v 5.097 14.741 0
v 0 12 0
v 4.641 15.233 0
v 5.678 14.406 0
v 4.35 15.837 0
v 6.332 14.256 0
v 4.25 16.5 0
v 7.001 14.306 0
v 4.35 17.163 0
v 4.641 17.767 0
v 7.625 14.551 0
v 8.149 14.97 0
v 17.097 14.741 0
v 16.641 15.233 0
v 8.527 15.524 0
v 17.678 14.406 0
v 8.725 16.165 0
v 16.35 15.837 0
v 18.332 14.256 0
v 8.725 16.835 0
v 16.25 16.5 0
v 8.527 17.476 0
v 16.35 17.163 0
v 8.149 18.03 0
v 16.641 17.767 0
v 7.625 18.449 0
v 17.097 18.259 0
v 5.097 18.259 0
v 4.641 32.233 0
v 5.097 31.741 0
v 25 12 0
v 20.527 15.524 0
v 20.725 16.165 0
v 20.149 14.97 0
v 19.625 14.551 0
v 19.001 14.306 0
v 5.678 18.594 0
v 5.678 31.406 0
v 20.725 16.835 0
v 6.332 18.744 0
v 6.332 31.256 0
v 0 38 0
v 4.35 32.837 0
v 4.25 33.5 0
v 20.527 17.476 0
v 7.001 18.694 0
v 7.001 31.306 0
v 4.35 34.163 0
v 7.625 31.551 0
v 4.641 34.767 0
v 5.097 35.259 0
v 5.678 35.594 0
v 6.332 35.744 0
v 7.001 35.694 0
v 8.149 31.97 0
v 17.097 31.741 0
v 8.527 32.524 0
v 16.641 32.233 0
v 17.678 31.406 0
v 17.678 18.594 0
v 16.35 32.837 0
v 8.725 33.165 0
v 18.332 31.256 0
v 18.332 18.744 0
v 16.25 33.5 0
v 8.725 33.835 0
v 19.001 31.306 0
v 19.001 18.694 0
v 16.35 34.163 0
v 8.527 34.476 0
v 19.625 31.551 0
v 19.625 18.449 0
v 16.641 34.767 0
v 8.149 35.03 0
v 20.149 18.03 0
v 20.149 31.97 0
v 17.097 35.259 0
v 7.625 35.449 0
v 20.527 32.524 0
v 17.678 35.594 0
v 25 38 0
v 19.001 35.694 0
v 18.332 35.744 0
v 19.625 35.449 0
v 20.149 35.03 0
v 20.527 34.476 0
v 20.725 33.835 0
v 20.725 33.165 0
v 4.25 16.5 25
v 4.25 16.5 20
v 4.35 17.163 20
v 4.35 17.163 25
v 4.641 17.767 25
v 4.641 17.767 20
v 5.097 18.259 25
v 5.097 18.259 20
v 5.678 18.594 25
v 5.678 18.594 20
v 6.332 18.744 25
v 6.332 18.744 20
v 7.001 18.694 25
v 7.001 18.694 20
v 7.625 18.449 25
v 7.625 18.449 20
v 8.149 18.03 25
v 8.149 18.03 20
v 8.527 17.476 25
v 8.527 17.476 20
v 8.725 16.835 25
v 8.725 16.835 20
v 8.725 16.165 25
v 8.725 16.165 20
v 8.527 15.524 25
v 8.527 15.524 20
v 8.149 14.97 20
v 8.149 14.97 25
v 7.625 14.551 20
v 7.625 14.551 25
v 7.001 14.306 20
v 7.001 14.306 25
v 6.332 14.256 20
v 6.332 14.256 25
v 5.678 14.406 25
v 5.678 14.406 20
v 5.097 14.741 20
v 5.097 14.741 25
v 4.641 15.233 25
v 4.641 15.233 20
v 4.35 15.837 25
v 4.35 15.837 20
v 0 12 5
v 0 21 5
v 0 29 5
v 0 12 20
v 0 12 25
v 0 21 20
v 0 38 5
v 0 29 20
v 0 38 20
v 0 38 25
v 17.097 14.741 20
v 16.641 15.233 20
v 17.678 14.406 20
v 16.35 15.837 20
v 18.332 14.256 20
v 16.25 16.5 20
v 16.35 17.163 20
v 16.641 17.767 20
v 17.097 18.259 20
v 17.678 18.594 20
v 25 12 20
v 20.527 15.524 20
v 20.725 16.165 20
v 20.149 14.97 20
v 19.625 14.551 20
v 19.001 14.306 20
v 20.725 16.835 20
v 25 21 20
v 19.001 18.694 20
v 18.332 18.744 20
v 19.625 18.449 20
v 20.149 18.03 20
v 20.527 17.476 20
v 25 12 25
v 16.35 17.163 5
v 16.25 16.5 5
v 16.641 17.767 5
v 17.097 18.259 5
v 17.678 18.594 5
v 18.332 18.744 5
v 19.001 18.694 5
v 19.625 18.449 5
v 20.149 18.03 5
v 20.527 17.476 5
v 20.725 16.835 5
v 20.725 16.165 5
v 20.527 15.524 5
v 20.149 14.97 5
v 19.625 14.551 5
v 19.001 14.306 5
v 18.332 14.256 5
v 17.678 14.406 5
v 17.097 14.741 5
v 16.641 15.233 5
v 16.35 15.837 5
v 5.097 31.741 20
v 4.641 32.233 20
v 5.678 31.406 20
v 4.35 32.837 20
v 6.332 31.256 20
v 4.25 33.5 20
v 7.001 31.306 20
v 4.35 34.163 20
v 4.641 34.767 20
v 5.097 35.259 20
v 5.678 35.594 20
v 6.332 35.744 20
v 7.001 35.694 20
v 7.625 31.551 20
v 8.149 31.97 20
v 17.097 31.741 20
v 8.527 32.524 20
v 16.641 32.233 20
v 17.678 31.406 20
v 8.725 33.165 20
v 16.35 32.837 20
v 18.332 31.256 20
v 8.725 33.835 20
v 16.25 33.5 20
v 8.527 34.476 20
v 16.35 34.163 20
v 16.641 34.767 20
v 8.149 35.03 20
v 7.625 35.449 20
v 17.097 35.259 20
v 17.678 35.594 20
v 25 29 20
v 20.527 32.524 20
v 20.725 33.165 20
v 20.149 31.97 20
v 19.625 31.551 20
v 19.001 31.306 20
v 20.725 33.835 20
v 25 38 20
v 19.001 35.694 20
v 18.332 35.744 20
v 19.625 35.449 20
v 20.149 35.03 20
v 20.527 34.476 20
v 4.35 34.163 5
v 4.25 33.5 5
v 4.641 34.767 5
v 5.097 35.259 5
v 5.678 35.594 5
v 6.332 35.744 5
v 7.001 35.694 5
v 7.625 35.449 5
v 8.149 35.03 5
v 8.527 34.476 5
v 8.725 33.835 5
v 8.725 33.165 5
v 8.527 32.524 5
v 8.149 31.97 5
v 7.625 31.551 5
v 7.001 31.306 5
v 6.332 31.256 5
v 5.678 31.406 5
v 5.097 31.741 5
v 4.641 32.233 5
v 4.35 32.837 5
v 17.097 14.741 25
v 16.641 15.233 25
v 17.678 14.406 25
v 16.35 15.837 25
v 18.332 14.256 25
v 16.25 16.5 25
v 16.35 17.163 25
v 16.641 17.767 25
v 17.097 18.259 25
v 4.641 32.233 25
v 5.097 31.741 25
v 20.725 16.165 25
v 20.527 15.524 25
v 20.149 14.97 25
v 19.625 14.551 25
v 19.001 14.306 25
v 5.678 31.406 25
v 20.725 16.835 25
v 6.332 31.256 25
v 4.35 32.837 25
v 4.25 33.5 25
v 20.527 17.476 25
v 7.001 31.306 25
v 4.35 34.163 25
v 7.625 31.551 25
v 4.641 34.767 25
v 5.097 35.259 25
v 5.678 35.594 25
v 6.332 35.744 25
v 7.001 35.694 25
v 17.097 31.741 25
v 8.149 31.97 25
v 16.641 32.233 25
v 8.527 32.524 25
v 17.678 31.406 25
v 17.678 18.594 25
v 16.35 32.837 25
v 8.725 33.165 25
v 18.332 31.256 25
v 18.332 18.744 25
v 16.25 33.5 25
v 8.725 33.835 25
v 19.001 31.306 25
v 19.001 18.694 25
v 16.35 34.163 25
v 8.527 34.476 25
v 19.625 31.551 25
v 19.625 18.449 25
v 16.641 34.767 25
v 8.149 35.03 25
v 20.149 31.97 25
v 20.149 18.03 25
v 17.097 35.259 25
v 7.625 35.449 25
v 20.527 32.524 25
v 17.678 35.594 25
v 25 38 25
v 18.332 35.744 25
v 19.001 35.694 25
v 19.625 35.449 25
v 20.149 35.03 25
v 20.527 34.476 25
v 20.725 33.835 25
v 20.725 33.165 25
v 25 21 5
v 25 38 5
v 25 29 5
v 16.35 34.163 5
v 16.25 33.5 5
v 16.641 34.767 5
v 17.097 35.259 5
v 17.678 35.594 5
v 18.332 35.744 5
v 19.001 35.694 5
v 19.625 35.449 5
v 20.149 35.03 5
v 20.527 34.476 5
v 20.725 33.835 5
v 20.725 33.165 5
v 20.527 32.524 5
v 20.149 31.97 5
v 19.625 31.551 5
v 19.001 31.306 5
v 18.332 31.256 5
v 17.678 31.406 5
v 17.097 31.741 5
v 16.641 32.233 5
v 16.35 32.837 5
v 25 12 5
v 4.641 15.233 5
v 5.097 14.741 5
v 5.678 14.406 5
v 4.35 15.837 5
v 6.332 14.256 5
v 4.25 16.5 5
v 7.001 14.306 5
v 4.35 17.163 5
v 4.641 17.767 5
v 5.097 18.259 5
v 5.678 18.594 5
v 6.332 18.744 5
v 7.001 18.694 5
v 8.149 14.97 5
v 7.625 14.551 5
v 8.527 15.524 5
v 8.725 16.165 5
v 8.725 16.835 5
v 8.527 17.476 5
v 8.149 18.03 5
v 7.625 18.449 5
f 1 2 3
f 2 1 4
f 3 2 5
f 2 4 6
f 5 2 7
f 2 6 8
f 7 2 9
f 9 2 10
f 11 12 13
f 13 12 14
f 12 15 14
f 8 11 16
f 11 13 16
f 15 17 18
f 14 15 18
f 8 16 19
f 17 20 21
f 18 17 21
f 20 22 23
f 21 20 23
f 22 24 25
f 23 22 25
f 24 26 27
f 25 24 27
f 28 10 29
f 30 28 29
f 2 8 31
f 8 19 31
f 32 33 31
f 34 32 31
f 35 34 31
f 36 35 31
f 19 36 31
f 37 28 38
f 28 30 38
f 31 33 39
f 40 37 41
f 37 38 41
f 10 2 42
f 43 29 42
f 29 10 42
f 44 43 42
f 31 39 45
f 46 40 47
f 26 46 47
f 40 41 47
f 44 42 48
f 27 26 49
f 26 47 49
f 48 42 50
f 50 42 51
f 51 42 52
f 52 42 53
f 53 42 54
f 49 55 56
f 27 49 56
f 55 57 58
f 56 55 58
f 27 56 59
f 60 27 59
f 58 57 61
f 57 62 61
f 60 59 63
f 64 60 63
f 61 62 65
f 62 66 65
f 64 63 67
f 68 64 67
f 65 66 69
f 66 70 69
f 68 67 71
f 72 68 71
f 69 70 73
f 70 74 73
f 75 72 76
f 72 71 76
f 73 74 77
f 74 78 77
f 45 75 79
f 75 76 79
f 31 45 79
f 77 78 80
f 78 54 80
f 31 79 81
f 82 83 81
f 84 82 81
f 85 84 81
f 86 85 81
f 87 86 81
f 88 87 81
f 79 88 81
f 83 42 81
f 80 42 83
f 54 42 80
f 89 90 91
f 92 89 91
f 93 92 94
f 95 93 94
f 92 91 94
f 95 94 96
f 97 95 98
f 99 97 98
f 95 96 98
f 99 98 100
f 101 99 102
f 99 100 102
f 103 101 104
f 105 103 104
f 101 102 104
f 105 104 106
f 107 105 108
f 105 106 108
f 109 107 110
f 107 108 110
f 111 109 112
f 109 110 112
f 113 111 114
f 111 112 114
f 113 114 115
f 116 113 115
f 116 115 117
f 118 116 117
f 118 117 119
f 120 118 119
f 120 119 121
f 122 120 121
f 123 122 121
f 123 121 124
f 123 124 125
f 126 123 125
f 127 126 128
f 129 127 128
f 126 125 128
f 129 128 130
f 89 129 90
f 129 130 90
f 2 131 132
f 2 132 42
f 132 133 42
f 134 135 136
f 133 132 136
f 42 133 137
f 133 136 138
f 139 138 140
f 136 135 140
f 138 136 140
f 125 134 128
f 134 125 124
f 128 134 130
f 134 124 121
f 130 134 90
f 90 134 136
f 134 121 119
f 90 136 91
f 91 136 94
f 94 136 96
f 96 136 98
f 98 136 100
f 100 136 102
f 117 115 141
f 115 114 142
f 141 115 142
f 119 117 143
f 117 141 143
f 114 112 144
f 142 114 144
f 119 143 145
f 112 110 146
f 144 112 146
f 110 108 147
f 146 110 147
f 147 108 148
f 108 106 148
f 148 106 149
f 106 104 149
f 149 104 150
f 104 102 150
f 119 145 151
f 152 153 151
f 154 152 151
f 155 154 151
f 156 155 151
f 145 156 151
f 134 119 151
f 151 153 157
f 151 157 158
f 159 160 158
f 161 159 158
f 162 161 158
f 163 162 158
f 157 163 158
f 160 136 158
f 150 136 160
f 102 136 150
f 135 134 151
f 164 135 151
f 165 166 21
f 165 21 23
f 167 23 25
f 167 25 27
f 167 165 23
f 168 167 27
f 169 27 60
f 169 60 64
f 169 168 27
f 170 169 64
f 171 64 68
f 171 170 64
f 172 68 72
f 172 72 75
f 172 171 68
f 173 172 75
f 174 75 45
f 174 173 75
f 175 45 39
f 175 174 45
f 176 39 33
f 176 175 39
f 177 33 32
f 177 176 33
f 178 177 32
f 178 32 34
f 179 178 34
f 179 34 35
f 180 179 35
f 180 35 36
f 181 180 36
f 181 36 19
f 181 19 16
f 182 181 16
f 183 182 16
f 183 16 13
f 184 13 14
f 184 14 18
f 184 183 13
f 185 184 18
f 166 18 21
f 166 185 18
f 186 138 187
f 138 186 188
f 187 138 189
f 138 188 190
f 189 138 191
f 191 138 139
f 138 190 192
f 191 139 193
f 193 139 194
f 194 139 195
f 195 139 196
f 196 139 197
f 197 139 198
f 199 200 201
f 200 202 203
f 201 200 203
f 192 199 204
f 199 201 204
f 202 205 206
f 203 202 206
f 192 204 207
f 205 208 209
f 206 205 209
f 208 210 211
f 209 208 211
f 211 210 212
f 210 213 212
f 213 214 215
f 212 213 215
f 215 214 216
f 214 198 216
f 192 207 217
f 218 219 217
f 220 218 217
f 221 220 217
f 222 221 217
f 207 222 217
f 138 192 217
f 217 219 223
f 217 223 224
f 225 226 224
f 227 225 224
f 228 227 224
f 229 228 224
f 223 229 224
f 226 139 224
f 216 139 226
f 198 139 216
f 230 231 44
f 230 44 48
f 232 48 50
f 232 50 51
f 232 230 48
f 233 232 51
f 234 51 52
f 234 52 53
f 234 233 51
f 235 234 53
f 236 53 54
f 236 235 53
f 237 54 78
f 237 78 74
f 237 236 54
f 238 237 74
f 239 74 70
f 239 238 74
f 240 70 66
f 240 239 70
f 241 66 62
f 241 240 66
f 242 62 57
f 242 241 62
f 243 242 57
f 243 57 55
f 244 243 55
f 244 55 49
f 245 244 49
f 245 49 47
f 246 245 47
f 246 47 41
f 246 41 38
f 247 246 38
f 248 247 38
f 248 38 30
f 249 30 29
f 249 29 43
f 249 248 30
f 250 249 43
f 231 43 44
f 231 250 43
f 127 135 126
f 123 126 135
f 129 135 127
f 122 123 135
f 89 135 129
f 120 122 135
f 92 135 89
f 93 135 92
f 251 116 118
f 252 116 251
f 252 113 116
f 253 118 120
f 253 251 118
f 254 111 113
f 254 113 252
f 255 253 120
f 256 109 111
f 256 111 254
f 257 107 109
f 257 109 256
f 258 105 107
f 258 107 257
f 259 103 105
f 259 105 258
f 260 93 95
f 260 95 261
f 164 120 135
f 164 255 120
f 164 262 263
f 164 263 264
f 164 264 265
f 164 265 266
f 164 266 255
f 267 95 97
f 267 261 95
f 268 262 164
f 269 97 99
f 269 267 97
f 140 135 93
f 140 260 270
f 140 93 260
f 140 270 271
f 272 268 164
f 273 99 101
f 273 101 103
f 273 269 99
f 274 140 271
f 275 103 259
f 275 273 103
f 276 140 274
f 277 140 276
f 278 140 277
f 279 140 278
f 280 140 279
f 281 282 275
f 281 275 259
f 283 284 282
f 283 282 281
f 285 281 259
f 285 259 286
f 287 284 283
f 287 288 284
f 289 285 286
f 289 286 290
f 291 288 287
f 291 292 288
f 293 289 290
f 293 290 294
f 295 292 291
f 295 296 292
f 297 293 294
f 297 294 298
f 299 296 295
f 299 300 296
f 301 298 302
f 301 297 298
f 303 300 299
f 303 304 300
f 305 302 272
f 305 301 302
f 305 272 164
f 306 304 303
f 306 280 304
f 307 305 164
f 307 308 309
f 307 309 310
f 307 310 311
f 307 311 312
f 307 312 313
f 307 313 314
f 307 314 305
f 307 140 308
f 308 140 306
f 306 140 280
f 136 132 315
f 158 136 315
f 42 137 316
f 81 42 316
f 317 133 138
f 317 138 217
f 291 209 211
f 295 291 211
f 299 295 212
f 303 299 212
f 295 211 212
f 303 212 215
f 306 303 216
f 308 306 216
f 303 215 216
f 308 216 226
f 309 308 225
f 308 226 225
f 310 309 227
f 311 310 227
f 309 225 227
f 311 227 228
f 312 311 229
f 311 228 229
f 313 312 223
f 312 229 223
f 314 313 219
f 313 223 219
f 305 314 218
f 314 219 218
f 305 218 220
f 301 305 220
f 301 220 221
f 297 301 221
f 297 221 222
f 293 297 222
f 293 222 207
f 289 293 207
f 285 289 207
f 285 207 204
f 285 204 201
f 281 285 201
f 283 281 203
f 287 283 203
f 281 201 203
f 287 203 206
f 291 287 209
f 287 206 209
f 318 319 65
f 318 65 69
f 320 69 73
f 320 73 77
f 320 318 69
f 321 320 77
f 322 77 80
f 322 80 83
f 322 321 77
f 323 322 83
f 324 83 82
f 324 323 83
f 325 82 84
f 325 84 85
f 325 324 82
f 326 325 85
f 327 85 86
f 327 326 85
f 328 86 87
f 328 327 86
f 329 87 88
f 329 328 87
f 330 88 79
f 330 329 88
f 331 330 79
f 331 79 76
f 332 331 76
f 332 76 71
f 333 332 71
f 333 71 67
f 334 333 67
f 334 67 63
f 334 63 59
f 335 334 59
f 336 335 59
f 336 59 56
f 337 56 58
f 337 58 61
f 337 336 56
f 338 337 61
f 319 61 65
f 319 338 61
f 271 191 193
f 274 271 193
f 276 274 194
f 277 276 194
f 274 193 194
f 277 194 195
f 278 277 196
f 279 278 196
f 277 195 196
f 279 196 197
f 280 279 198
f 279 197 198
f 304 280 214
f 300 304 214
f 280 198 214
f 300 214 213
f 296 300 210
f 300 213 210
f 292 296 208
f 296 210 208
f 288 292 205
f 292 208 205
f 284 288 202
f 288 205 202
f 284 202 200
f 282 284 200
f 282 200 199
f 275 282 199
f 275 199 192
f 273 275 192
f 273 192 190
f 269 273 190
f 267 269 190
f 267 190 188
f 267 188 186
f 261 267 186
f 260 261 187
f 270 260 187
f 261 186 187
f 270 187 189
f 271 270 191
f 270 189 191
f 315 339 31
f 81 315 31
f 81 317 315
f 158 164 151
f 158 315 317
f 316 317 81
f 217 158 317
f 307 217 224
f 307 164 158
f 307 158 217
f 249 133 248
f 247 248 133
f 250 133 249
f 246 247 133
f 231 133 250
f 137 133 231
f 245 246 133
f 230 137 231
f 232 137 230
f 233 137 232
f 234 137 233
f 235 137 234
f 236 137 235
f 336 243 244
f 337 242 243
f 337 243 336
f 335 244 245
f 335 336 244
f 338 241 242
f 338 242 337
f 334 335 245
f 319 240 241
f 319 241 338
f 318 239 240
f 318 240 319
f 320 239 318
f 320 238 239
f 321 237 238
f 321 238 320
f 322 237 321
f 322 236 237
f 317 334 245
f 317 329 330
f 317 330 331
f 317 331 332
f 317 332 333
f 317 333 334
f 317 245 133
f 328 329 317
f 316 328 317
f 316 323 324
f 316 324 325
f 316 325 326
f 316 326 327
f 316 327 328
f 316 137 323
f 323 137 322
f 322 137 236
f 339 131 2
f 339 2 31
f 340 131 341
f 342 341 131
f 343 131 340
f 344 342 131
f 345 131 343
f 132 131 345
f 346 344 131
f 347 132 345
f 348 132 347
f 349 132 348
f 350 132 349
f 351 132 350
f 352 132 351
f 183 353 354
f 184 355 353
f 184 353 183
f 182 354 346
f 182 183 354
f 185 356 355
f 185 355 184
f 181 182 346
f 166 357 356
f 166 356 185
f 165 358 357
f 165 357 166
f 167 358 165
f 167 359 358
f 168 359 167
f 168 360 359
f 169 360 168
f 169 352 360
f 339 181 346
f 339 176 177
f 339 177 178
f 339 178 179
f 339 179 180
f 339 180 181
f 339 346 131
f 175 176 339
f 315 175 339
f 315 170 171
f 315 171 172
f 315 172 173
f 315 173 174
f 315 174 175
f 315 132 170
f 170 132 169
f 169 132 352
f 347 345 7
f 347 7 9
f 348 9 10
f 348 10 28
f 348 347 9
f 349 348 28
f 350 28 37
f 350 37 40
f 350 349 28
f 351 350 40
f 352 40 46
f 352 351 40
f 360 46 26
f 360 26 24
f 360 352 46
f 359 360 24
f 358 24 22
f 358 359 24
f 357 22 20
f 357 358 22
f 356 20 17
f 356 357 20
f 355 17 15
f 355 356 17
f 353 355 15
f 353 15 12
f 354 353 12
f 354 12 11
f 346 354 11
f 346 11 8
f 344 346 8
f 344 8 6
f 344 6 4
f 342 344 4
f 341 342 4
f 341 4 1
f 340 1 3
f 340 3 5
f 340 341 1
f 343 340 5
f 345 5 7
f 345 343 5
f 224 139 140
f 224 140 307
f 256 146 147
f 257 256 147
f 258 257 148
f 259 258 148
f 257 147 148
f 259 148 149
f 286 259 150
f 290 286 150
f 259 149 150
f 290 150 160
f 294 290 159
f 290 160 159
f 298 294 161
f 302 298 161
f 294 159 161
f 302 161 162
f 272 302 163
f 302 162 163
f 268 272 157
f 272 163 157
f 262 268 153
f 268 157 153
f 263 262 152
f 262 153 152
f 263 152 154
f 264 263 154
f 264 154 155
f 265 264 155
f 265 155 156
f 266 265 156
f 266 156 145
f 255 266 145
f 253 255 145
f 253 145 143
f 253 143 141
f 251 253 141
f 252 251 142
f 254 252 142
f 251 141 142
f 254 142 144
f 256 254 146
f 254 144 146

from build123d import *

# Parameters (mm, degrees)
SKETCH_1_W          = 25
SKETCH_1_H          = 50
EXTRUDE_1_DEPTH     = 5
SKETCH_2_R          = 2.25
CUT_EXTRUDE_1_DEPTH = 20
SKETCH_3_W          = 25
SKETCH_3_H          = 8
EXTRUDE_2_DEPTH     = 15
SKETCH_4_W          = 25
SKETCH_4_H          = 26
EXTRUDE_3_DEPTH     = 5
SKETCH_5_R          = 2.25
CUT_EXTRUDE_2_DEPTH = 5
SKETCH_6_W          = 25
SKETCH_6_H          = 50
CUT_EXTRUDE_3_DEPTH = 5


with BuildPart() as part:
    # 草图1 → 凸台-拉伸1 (new body)
    with BuildSketch(Plane.XY):
        with Locations((12.5, 25)):
            Rectangle(SKETCH_1_W, SKETCH_1_H)
    extrude(amount=EXTRUDE_1_DEPTH)

    # 草图2 → 切除-拉伸1 (cut)
    with BuildSketch(Plane.XY.offset(5)):
        with Locations((12.5, 7.5)):
            Circle(SKETCH_2_R)
        with Locations((12.5, 42.5)):
            Circle(SKETCH_2_R)
    extrude(amount=-CUT_EXTRUDE_1_DEPTH, mode=Mode.SUBTRACT)

    # 草图3 → 凸台-拉伸2 (add)
    with BuildSketch(Plane.XY.offset(5)):
        with Locations((12.5, 25)):
            Rectangle(SKETCH_3_W, SKETCH_3_H)
    extrude(amount=EXTRUDE_2_DEPTH)

    # 草图4 → 凸台-拉伸3 (add)
    with BuildSketch(Plane.XY.offset(20)):
        with Locations((12.5, 25)):
            Rectangle(SKETCH_4_W, SKETCH_4_H)
    extrude_3 = extrude(amount=EXTRUDE_3_DEPTH)

    # 草图5 → 切除-拉伸2 (cut)
    with BuildSketch(Plane(origin=(0, 0, 20), x_dir=(-1, 0, 0), z_dir=(0, 0, -1))):
        with Locations((-18.5, 33.5)):
            Circle(SKETCH_5_R)
        with Locations((-6.5, 33.5)):
            Circle(SKETCH_5_R)
        with Locations((-6.5, 16.5)):
            Circle(SKETCH_5_R)
        with Locations((-18.5, 16.5)):
            Circle(SKETCH_5_R)
    cut_extrude_2 = extrude(amount=-CUT_EXTRUDE_2_DEPTH, mode=Mode.SUBTRACT)

    # 草图6 → 切除-拉伸3 (cut)
    with BuildSketch(Plane(origin=(0, 0, 0), x_dir=(-1, 0, 0), z_dir=(0, 0, -1))):
        with Locations((-12.5, 25)):
            Rectangle(SKETCH_6_W, SKETCH_6_H)
    extrude(amount=-CUT_EXTRUDE_3_DEPTH, mode=Mode.SUBTRACT)

    # 镜向1: 凸台-拉伸3, 切除-拉伸2 across plane
    add(extrude_3.mirror(Plane(origin=(0, 0, 12.5), x_dir=(1, 0, 0), z_dir=(0, 0, -1))))
    add(cut_extrude_2.mirror(Plane(origin=(0, 0, 12.5), x_dir=(1, 0, 0), z_dir=(0, 0, -1))), mode=Mode.SUBTRACT)


solid = part.part
